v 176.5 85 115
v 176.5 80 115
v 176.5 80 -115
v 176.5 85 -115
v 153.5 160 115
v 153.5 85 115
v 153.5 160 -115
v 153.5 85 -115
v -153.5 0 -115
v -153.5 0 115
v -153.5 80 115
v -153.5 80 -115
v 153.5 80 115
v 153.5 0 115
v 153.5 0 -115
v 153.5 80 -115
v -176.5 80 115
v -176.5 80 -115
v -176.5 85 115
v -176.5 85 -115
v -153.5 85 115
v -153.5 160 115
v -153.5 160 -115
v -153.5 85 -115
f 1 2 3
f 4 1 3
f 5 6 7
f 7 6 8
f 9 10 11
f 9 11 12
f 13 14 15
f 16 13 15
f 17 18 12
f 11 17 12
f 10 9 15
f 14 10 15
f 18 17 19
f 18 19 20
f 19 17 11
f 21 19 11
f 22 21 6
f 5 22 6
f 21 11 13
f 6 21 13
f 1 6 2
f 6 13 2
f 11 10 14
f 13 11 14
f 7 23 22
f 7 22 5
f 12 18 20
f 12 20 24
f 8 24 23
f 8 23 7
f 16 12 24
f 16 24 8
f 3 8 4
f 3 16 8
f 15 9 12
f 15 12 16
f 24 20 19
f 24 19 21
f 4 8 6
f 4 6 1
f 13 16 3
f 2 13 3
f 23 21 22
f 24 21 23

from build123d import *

# Parameters (mm, degrees)
SKETCH1_W           = 307
SKETCH1_H           = 230
BOSS_EXTRUDE1_DEPTH = 160
BOSS_EXTRUDE2_START = 80
SKETCH1_3_W         = 23
SKETCH1_3_H         = 230
BOSS_EXTRUDE2_DEPTH = 5


with BuildPart() as part:
    # Sketch1 → Boss-Extrude1 (new body)
    with BuildSketch(Plane(origin=(0, 0, 0), x_dir=(1, 0, 0), z_dir=(0, 1, 0))):
        Rectangle(SKETCH1_W, SKETCH1_H)
    extrude(amount=BOSS_EXTRUDE1_DEPTH)

    # Sketch1<3> → Boss-Extrude2 (add)
    with BuildSketch(Plane(origin=(0, 0, 0), x_dir=(1, 0, 0), z_dir=(0, 1, 0)).offset(BOSS_EXTRUDE2_START)):
        with Locations((-165, 0)):
            Rectangle(SKETCH1_3_W, SKETCH1_3_H)
        with Locations((165, 0)):
            Rectangle(SKETCH1_3_W, SKETCH1_3_H)
    extrude(amount=BOSS_EXTRUDE2_DEPTH)


solid = part.part
